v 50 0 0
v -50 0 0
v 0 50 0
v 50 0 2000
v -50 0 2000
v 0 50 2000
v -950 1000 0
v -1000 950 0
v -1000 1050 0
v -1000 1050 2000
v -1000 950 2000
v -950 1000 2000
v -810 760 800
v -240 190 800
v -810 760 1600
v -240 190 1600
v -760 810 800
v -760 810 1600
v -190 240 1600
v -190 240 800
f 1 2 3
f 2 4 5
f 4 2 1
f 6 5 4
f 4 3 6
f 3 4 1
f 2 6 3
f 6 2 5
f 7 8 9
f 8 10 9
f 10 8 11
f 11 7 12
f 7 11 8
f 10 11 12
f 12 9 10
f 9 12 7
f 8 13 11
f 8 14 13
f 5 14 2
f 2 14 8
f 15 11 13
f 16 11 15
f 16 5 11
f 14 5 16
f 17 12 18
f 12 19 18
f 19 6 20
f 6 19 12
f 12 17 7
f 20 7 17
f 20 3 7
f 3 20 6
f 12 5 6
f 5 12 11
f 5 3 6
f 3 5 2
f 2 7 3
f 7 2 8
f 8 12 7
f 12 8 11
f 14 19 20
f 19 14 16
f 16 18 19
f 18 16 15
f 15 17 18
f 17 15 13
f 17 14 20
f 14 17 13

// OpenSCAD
// file: ../../../libs/basic-dims.scad
unit = 1000;

section_width = unit;
section_height = unit * 2;
section_thickness = unit * 0.1;

rt = sqrt(2);

//  -- Notes --
//  Z is UP
//  X is FORWARD (out of the screen)
// file: ../../../libs/modifiers/diagonalize.scad
include <../basic-dims.scad>

module diagonalize_triangle_sketch(t = section_thickness) {
    x = sin(45) * t;
    y = cos(45) * t;

    polygon([
        [0, y],
        [x, 0],
        [0, -y]
    ]);
}

module diagonalize_triangle(t = section_thickness) {
    rotate([0, 0, 90])
    linear_extrude(section_height)
    diagonalize_triangle_sketch(t);
}

module diagonalize2D() {
    thickness = section_thickness / rt;

    trans = (section_thickness/2)*rt/2;
    len_scale = rt - section_thickness / (rt * section_width);

    rotate([0, 0, 45])
    translate([trans, 0, 0])
    scale([len_scale, 1/rt, 1])
    children();
}


module diagonalize3D(w = section_width, t = section_thickness, edges = "trans") {

    trans = (t/2)*rt/2;
    len_scale = rt - t / (rt * w);

    edge_angle = edges == "cis" ? 270 : 180;
    
    diagonalize_triangle(t/rt);

    translate([-w, w, 0])
    rotate([0, 0, edge_angle]) // 180 For continue, -90 (270) for end
    diagonalize_triangle(t/rt);

    rotate([0, 0, 45])
    translate([0, trans, 0])
    scale([1/rt, len_scale, 1])
    children();
}
// file: ../../../libs/templates/t_window.scad
include <../basic-dims.scad>

simple_window_width = 0.6 * section_width;
simple_window_height = 0.4 * section_height;
simple_window_bottom_offset = 0.4 * section_height;

module simple_window_sketch() {
    difference() {
        square([section_width, section_height]);

        translate([
            section_width/2 - simple_window_width/2,
            simple_window_bottom_offset,
            0])
        square([simple_window_width, simple_window_height]);
    }
}

module window() {
    rotate([90, 0, 90])
    translate([0, 0, -section_thickness/2])
    linear_extrude(section_thickness)
    simple_window_sketch();
}
// main file
include <../../../libs/templates/t_window.scad>
include <../../../libs/modifiers/diagonalize.scad>

diagonalize3D(edges="cis")
window();
